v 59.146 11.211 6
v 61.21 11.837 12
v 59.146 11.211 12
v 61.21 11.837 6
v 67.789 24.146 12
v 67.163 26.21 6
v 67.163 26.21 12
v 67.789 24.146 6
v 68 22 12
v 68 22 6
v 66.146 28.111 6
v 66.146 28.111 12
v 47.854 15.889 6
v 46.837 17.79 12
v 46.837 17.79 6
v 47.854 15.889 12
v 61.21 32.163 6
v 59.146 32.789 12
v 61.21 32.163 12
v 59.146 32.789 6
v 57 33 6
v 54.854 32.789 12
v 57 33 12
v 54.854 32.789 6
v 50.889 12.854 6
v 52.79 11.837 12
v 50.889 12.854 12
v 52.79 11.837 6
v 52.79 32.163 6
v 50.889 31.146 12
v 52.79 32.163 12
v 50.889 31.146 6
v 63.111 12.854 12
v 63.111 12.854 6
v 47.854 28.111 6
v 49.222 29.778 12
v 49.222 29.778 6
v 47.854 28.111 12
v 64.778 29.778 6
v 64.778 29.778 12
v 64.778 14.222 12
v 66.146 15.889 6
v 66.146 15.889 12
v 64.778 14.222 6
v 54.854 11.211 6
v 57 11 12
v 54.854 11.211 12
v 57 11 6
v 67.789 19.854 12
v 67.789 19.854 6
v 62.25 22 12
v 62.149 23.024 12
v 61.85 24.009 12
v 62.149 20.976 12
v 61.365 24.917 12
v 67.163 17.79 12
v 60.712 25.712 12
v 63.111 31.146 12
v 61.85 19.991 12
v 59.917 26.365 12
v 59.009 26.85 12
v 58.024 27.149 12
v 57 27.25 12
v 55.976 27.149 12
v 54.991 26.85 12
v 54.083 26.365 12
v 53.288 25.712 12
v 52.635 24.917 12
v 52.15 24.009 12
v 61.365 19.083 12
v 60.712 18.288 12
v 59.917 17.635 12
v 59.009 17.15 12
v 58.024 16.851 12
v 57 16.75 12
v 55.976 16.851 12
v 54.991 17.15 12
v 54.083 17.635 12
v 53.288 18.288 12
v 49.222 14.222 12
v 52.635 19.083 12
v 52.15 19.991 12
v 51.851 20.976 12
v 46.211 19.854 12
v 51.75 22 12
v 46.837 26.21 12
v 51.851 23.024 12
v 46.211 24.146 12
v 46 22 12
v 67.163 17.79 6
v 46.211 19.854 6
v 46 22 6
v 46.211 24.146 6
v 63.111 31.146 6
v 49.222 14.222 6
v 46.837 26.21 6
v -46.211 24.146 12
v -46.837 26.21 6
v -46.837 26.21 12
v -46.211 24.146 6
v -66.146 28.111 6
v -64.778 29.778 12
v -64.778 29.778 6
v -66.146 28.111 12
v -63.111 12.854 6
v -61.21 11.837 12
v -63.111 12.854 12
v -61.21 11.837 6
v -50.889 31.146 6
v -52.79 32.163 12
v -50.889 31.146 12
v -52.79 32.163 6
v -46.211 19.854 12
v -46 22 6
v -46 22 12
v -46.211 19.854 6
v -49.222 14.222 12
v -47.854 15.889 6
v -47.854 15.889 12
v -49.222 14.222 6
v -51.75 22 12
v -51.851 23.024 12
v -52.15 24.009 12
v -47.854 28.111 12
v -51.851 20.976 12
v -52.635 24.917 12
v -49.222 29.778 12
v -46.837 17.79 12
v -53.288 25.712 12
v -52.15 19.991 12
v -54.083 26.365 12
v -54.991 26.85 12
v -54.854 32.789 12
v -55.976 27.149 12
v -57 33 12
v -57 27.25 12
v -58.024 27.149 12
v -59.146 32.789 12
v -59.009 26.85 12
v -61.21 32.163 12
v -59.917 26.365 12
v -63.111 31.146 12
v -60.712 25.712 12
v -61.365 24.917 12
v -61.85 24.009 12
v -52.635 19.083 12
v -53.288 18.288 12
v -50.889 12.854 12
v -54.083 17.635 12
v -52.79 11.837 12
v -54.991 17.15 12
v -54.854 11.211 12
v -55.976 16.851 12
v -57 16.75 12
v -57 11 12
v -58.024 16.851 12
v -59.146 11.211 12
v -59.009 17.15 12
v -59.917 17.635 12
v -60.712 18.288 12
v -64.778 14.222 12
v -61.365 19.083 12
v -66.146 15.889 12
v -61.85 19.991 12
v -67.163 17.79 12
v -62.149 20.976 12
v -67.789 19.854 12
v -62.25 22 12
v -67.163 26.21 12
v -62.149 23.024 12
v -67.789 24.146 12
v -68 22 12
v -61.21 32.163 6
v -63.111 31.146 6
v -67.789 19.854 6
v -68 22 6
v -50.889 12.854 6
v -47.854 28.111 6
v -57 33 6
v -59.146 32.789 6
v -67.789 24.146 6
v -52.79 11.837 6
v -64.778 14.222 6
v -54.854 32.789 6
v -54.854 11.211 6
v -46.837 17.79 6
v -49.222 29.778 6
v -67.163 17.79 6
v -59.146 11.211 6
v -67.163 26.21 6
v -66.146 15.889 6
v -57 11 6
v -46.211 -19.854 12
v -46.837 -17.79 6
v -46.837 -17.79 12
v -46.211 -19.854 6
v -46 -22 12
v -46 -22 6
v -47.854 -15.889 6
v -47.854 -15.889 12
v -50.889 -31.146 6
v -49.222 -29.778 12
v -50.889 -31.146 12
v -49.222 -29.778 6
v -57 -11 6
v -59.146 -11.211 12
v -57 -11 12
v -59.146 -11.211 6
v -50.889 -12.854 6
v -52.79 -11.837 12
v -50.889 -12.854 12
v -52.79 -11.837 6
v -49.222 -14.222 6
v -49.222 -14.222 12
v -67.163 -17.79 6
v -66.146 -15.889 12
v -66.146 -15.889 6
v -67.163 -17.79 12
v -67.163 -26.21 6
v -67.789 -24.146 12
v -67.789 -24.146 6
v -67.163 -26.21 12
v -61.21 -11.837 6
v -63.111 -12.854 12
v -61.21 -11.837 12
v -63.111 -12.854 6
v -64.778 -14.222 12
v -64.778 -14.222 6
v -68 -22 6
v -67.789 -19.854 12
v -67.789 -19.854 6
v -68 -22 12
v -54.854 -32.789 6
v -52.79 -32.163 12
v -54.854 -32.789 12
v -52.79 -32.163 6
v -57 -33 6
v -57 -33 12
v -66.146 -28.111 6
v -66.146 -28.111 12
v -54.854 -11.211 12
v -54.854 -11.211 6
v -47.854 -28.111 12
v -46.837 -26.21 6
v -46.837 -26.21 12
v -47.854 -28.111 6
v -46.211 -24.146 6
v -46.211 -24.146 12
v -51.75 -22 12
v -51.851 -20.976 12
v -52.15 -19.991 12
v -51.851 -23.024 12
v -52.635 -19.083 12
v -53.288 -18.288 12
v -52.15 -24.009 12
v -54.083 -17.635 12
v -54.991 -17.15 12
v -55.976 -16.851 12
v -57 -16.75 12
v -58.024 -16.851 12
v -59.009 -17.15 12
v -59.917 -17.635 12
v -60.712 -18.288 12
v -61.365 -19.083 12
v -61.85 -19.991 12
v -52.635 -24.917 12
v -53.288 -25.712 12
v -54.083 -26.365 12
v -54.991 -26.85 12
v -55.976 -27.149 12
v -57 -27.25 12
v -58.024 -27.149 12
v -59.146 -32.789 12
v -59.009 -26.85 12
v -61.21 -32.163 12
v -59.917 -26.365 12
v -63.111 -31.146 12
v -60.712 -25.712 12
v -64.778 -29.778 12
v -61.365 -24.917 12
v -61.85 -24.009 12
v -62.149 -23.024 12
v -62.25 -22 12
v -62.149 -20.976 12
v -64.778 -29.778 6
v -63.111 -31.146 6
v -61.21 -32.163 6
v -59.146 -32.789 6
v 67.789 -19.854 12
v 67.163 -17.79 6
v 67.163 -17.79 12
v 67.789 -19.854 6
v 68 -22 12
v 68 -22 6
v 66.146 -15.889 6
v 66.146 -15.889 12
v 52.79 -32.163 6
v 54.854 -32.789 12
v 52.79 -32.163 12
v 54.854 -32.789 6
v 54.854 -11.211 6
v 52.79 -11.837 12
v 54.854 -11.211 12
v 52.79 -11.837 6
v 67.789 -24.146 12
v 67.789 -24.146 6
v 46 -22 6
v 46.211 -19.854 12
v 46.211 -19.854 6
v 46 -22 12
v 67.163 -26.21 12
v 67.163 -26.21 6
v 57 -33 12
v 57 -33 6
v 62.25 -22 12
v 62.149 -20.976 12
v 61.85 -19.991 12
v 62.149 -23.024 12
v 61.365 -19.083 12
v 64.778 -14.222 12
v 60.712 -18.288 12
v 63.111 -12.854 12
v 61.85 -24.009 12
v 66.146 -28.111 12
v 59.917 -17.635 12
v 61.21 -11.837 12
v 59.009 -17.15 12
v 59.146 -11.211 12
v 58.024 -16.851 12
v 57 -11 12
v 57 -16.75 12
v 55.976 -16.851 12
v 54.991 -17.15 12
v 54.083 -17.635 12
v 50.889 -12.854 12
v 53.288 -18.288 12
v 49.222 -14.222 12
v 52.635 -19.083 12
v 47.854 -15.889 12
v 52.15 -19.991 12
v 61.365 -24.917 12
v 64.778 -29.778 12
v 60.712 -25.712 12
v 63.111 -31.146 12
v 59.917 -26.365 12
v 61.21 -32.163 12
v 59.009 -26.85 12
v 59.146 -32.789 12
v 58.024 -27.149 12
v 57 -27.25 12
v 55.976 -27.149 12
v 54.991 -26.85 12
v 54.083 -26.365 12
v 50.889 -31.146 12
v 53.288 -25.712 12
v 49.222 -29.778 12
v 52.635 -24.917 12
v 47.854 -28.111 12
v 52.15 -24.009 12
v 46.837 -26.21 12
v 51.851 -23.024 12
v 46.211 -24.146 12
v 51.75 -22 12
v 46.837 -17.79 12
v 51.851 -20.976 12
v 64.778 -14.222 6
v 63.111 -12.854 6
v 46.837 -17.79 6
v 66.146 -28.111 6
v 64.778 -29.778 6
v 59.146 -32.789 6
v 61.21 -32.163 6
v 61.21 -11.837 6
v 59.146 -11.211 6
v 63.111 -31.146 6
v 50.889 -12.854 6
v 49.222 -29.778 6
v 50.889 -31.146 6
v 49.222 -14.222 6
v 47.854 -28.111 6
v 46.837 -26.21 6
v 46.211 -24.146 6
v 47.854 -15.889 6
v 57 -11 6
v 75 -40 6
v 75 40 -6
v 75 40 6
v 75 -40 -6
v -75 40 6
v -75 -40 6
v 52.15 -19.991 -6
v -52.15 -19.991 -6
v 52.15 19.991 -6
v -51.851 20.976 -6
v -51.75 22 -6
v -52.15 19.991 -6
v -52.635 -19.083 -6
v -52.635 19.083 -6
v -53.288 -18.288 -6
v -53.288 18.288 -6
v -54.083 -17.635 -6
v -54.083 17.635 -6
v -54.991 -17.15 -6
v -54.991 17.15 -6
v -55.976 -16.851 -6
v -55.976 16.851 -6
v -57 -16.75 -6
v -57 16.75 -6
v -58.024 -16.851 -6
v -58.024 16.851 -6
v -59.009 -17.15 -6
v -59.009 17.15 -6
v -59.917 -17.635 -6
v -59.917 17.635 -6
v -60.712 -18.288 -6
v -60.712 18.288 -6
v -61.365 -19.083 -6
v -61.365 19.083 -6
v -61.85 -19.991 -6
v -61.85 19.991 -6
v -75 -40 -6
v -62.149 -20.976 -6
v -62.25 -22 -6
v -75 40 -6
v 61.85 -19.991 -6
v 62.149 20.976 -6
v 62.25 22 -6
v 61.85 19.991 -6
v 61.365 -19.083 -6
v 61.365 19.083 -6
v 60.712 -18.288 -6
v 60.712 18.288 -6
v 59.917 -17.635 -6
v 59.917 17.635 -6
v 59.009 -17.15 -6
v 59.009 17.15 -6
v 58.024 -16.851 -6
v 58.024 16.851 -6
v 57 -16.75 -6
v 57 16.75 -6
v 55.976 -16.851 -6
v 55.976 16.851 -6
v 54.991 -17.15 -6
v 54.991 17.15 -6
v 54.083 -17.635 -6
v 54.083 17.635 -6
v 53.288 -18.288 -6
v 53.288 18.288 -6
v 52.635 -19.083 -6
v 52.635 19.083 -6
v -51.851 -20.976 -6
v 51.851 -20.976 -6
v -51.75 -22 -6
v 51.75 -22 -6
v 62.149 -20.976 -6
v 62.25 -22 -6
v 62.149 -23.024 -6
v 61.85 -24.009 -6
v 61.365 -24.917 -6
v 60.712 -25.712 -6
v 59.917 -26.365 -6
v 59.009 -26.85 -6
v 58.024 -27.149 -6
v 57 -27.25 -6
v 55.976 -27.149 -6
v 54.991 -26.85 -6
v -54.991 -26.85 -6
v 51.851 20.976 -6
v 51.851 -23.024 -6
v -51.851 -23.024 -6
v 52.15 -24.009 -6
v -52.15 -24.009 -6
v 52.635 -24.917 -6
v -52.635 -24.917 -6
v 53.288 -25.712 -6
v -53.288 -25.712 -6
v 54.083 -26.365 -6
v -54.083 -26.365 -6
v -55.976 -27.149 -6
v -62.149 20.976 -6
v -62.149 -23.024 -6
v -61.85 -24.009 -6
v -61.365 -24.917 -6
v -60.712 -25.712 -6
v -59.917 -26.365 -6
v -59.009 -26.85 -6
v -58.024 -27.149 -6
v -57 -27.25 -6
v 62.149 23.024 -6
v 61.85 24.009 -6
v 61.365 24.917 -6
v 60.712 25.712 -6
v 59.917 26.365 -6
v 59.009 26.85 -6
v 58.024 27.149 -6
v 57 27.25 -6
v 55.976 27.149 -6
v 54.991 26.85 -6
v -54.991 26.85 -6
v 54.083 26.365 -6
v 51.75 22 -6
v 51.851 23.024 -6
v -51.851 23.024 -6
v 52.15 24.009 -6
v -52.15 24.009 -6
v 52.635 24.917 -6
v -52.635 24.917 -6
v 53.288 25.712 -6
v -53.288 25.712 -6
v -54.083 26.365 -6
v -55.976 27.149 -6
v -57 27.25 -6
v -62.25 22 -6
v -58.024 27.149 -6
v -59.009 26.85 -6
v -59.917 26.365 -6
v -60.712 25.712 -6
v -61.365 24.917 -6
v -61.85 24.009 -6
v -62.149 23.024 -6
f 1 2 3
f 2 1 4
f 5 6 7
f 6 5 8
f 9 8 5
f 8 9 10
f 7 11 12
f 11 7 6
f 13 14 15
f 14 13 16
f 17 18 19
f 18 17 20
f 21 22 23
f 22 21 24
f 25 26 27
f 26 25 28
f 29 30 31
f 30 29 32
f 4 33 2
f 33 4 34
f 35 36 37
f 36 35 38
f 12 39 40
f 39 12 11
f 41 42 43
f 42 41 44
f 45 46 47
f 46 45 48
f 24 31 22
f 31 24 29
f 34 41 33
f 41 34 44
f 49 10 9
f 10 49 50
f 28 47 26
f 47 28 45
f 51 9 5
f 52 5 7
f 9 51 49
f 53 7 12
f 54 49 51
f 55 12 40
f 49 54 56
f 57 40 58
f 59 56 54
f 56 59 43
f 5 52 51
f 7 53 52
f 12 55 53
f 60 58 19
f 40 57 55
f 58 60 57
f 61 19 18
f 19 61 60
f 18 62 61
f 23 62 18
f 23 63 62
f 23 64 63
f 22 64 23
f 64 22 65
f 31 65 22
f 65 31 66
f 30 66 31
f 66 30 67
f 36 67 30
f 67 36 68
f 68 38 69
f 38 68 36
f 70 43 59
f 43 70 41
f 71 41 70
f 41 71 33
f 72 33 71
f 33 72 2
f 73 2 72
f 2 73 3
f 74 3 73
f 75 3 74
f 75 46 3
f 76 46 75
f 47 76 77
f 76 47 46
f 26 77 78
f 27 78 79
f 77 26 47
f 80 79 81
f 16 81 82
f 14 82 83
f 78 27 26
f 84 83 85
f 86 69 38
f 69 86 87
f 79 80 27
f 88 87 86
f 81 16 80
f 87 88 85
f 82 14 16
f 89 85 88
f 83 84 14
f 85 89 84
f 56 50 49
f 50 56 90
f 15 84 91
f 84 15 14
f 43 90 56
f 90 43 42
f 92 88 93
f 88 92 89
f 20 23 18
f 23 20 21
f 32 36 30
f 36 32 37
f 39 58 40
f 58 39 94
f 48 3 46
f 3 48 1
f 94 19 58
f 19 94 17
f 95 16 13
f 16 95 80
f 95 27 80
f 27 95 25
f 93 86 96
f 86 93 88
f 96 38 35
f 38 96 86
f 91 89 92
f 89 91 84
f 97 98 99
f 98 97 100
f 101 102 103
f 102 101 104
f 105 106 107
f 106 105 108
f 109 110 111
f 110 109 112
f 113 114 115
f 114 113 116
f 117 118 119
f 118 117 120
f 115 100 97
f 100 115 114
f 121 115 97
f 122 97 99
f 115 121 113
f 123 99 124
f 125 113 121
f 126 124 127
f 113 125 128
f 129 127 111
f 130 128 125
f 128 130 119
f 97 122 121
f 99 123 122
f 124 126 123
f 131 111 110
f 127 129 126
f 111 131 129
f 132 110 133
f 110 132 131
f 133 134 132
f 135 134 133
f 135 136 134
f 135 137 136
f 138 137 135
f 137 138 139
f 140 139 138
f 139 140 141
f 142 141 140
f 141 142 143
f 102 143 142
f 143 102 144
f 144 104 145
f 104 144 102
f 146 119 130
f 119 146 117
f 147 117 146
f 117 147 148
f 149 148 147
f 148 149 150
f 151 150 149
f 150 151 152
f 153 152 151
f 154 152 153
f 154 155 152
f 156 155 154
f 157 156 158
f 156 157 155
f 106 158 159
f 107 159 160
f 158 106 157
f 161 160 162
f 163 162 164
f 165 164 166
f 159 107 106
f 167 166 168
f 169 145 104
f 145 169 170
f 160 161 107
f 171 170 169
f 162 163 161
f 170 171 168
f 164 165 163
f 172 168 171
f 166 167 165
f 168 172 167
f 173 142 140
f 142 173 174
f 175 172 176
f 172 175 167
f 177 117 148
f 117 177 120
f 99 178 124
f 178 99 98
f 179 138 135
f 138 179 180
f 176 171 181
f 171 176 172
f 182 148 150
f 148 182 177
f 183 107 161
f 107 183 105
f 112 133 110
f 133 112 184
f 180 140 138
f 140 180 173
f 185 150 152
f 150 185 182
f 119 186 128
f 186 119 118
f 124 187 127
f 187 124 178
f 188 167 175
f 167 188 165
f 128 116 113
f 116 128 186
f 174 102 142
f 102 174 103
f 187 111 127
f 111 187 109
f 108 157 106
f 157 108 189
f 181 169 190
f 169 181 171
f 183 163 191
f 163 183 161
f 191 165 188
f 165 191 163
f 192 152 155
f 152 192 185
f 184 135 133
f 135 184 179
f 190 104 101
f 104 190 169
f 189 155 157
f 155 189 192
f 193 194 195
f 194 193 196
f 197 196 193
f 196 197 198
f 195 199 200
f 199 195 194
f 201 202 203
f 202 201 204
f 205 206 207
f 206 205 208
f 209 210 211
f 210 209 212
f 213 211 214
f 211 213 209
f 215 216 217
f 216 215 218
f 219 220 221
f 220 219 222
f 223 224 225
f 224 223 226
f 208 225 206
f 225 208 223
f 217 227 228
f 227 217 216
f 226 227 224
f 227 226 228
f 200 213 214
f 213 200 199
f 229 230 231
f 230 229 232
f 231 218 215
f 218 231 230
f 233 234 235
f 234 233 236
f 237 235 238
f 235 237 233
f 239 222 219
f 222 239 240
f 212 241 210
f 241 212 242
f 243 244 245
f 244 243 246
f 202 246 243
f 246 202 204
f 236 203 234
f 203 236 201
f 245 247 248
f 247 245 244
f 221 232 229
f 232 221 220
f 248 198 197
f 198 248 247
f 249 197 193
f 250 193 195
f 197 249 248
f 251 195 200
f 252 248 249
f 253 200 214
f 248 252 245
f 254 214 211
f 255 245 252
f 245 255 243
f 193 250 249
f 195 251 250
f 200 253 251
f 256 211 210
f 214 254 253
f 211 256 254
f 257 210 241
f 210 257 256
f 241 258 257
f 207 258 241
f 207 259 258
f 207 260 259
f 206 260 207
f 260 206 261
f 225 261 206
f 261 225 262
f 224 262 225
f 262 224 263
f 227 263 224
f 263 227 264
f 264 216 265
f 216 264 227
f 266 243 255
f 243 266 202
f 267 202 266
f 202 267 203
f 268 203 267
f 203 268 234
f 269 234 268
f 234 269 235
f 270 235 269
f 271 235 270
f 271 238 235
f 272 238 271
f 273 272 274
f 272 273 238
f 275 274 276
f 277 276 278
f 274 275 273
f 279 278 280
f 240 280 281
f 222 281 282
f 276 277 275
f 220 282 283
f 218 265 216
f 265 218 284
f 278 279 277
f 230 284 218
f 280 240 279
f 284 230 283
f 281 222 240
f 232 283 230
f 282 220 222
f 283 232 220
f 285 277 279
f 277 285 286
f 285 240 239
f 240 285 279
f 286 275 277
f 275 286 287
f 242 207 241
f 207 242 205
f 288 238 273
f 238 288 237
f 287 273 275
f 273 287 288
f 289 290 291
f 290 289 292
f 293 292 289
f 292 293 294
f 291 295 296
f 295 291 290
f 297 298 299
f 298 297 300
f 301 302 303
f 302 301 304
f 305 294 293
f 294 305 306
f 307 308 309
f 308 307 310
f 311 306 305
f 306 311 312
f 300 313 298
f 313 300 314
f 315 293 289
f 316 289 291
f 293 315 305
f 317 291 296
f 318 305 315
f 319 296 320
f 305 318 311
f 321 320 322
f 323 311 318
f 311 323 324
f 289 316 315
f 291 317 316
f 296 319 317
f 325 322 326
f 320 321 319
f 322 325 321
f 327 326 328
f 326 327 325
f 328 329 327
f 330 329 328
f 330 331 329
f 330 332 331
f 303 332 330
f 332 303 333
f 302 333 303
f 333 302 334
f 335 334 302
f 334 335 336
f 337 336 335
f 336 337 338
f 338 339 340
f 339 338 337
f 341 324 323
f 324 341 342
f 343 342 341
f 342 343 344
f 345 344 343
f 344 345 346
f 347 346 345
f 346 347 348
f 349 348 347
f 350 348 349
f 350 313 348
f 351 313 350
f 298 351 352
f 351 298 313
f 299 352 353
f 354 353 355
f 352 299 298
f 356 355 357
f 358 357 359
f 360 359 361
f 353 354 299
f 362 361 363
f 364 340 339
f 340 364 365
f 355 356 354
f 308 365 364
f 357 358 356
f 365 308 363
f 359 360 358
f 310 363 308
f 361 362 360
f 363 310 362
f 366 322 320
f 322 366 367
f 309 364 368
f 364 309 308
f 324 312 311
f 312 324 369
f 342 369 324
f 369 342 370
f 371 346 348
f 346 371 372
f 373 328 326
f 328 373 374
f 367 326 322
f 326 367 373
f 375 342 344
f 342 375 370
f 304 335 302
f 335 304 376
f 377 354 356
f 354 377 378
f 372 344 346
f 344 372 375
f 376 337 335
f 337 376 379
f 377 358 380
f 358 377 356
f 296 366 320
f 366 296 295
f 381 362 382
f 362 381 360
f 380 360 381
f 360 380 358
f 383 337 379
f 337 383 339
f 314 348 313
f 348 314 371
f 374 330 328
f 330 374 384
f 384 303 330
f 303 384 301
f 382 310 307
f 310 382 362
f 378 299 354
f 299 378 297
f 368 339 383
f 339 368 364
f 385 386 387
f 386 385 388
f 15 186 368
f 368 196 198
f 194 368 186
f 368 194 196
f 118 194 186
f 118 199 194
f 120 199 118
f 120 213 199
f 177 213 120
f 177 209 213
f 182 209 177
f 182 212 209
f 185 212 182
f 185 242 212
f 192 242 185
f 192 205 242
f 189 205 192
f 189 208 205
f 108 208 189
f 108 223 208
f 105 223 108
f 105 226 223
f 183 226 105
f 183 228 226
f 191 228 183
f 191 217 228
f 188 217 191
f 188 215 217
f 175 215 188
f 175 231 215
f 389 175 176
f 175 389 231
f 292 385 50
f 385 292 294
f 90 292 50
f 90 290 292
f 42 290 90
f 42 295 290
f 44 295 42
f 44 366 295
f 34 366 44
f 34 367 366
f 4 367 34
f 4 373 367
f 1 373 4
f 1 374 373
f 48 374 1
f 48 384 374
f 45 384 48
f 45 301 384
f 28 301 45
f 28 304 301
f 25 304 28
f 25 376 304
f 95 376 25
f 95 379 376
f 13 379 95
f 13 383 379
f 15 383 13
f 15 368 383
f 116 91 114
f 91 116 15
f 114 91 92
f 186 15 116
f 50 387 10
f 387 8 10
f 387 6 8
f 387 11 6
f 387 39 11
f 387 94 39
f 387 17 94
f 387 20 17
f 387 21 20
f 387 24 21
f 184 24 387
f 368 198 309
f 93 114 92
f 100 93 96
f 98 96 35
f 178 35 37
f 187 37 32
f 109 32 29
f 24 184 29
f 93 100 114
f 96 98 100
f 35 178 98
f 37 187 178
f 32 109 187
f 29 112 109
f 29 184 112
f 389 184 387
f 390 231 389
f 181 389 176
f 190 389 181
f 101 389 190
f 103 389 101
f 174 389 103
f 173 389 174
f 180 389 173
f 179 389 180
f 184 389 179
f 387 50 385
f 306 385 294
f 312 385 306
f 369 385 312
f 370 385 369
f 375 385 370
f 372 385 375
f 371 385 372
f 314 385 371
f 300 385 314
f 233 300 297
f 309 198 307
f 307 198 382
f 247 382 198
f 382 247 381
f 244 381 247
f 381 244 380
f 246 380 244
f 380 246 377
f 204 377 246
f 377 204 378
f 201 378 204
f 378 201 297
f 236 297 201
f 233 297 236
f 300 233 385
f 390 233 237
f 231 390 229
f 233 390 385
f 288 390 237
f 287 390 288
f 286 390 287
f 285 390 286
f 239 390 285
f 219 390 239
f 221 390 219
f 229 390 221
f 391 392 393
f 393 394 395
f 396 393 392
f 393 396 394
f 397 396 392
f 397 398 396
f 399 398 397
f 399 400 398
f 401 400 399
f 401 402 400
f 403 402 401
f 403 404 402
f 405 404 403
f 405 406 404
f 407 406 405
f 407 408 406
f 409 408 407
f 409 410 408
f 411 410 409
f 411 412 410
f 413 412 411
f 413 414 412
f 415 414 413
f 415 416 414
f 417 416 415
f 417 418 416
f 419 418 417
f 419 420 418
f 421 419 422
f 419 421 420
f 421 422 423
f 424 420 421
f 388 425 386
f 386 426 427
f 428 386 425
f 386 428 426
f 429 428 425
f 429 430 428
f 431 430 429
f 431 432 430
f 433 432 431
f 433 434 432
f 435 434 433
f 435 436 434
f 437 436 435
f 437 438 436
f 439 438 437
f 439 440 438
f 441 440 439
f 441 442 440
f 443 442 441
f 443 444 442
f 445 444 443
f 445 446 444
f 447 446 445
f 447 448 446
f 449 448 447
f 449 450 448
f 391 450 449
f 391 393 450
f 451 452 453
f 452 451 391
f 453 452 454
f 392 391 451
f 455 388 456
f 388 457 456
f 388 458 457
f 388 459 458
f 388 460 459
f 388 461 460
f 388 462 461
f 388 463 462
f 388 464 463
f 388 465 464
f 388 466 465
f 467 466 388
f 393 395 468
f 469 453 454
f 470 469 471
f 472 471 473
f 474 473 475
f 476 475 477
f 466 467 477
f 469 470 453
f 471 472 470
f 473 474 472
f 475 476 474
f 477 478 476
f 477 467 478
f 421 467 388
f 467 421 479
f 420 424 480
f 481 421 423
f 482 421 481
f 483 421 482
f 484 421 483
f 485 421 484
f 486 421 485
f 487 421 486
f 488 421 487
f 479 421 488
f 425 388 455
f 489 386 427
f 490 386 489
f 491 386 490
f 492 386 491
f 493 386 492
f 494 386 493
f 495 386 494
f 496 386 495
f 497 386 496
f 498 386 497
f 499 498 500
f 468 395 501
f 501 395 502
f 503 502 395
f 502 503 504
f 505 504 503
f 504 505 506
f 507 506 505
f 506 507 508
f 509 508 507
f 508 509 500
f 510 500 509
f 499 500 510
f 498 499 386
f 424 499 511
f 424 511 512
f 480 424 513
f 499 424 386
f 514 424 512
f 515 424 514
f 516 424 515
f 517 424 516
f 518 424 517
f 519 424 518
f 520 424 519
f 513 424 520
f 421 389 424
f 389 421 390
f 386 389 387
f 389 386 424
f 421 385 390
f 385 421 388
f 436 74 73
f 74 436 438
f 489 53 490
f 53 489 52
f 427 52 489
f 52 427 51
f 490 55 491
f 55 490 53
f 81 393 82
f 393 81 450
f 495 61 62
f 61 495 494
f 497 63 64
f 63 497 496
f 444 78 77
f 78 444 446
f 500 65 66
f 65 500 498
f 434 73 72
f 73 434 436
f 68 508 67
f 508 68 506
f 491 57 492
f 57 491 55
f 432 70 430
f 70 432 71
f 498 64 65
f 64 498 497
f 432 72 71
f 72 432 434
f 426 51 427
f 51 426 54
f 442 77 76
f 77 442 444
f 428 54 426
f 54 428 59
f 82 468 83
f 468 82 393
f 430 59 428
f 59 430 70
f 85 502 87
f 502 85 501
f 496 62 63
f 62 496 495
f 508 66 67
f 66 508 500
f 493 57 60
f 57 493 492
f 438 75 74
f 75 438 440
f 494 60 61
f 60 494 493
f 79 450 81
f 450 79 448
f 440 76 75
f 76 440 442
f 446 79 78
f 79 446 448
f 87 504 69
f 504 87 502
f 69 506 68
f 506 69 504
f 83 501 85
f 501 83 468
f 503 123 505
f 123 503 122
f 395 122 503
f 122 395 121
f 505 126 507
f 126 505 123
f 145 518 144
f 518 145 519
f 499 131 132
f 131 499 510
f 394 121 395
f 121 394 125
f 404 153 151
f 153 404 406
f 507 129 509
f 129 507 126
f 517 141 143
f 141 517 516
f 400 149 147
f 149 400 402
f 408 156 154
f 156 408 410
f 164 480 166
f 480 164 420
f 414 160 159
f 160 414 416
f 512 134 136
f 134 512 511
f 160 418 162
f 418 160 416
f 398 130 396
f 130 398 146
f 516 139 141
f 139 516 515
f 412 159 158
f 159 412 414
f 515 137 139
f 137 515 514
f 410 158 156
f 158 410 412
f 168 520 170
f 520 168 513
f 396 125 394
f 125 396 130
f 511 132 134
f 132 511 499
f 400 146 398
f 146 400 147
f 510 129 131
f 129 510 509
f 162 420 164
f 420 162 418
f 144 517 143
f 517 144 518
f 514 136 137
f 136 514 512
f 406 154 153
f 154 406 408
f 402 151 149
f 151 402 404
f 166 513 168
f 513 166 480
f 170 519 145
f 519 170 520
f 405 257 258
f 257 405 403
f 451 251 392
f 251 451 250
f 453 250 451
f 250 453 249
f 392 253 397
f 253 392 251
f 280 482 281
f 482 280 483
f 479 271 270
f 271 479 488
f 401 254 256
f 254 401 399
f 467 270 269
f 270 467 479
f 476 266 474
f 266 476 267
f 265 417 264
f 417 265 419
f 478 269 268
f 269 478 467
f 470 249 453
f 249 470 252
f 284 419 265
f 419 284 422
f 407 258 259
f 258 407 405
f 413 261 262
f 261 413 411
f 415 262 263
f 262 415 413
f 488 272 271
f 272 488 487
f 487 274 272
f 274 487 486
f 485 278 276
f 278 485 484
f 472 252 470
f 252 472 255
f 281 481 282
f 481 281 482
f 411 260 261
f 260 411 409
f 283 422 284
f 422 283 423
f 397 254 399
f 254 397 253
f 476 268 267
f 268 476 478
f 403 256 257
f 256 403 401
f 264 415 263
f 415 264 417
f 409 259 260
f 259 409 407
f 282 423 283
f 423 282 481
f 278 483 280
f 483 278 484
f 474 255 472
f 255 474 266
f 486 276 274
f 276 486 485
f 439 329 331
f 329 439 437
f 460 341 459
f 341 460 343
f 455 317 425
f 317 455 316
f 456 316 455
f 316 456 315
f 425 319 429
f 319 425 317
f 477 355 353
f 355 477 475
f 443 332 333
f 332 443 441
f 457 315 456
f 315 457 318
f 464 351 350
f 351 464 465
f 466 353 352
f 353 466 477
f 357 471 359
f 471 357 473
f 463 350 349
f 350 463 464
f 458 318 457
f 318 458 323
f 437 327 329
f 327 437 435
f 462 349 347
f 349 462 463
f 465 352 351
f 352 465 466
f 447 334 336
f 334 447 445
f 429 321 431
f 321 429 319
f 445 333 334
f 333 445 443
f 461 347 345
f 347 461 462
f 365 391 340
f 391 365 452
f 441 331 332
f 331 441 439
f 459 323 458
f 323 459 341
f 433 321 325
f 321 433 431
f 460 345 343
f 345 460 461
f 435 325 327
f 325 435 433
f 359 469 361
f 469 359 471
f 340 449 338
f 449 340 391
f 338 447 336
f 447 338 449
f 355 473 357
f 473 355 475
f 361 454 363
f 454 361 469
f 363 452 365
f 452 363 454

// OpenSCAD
$fn = 32;

// ----------------------------------------------------------------------
// Anchor pads 150 x 80 x 18
// four corner bosses with anchor holes
// ----------------------------------------------------------------------

// --- parameters (mm) ---
plate = [150, 80, 12];  // base plate size (x, y, z)
pads = 4;               // boss count, one per corner
edge = 18;              // boss centre offset from the plate edge
boss_d = 22;            // boss diameter
boss_h = 6;             // boss height above the base plate
hole_d = 10.5;          // hole diameter

// --- derived feature positions (mm) ---
height = plate[2] + boss_h;      // = 18   overall height of the part
corner_x = plate[0] / 2 - edge;  // = 57   boss centre X
corner_y = plate[1] / 2 - edge;  // = 22   boss centre Y
feature_centers = [
  [corner_x, corner_y],
  [-corner_x, corner_y],
  [-corner_x, -corner_y],
  [corner_x, -corner_y]
];   // boss centres, anchor holes are drilled there

// base plate, four bosses standing on it, anchor holes all the way through
difference() {
  union() {
    cube(plate, center = true);
    for (centre = feature_centers)
      translate([centre[0], centre[1], plate[2] / 2 - 1])
        cylinder(d = boss_d, h = boss_h + 1);
  }
  for (centre = feature_centers)
    translate([centre[0], centre[1], -height])
      cylinder(d = hole_d, h = 2 * height + 2);  // through boss and plate
}
